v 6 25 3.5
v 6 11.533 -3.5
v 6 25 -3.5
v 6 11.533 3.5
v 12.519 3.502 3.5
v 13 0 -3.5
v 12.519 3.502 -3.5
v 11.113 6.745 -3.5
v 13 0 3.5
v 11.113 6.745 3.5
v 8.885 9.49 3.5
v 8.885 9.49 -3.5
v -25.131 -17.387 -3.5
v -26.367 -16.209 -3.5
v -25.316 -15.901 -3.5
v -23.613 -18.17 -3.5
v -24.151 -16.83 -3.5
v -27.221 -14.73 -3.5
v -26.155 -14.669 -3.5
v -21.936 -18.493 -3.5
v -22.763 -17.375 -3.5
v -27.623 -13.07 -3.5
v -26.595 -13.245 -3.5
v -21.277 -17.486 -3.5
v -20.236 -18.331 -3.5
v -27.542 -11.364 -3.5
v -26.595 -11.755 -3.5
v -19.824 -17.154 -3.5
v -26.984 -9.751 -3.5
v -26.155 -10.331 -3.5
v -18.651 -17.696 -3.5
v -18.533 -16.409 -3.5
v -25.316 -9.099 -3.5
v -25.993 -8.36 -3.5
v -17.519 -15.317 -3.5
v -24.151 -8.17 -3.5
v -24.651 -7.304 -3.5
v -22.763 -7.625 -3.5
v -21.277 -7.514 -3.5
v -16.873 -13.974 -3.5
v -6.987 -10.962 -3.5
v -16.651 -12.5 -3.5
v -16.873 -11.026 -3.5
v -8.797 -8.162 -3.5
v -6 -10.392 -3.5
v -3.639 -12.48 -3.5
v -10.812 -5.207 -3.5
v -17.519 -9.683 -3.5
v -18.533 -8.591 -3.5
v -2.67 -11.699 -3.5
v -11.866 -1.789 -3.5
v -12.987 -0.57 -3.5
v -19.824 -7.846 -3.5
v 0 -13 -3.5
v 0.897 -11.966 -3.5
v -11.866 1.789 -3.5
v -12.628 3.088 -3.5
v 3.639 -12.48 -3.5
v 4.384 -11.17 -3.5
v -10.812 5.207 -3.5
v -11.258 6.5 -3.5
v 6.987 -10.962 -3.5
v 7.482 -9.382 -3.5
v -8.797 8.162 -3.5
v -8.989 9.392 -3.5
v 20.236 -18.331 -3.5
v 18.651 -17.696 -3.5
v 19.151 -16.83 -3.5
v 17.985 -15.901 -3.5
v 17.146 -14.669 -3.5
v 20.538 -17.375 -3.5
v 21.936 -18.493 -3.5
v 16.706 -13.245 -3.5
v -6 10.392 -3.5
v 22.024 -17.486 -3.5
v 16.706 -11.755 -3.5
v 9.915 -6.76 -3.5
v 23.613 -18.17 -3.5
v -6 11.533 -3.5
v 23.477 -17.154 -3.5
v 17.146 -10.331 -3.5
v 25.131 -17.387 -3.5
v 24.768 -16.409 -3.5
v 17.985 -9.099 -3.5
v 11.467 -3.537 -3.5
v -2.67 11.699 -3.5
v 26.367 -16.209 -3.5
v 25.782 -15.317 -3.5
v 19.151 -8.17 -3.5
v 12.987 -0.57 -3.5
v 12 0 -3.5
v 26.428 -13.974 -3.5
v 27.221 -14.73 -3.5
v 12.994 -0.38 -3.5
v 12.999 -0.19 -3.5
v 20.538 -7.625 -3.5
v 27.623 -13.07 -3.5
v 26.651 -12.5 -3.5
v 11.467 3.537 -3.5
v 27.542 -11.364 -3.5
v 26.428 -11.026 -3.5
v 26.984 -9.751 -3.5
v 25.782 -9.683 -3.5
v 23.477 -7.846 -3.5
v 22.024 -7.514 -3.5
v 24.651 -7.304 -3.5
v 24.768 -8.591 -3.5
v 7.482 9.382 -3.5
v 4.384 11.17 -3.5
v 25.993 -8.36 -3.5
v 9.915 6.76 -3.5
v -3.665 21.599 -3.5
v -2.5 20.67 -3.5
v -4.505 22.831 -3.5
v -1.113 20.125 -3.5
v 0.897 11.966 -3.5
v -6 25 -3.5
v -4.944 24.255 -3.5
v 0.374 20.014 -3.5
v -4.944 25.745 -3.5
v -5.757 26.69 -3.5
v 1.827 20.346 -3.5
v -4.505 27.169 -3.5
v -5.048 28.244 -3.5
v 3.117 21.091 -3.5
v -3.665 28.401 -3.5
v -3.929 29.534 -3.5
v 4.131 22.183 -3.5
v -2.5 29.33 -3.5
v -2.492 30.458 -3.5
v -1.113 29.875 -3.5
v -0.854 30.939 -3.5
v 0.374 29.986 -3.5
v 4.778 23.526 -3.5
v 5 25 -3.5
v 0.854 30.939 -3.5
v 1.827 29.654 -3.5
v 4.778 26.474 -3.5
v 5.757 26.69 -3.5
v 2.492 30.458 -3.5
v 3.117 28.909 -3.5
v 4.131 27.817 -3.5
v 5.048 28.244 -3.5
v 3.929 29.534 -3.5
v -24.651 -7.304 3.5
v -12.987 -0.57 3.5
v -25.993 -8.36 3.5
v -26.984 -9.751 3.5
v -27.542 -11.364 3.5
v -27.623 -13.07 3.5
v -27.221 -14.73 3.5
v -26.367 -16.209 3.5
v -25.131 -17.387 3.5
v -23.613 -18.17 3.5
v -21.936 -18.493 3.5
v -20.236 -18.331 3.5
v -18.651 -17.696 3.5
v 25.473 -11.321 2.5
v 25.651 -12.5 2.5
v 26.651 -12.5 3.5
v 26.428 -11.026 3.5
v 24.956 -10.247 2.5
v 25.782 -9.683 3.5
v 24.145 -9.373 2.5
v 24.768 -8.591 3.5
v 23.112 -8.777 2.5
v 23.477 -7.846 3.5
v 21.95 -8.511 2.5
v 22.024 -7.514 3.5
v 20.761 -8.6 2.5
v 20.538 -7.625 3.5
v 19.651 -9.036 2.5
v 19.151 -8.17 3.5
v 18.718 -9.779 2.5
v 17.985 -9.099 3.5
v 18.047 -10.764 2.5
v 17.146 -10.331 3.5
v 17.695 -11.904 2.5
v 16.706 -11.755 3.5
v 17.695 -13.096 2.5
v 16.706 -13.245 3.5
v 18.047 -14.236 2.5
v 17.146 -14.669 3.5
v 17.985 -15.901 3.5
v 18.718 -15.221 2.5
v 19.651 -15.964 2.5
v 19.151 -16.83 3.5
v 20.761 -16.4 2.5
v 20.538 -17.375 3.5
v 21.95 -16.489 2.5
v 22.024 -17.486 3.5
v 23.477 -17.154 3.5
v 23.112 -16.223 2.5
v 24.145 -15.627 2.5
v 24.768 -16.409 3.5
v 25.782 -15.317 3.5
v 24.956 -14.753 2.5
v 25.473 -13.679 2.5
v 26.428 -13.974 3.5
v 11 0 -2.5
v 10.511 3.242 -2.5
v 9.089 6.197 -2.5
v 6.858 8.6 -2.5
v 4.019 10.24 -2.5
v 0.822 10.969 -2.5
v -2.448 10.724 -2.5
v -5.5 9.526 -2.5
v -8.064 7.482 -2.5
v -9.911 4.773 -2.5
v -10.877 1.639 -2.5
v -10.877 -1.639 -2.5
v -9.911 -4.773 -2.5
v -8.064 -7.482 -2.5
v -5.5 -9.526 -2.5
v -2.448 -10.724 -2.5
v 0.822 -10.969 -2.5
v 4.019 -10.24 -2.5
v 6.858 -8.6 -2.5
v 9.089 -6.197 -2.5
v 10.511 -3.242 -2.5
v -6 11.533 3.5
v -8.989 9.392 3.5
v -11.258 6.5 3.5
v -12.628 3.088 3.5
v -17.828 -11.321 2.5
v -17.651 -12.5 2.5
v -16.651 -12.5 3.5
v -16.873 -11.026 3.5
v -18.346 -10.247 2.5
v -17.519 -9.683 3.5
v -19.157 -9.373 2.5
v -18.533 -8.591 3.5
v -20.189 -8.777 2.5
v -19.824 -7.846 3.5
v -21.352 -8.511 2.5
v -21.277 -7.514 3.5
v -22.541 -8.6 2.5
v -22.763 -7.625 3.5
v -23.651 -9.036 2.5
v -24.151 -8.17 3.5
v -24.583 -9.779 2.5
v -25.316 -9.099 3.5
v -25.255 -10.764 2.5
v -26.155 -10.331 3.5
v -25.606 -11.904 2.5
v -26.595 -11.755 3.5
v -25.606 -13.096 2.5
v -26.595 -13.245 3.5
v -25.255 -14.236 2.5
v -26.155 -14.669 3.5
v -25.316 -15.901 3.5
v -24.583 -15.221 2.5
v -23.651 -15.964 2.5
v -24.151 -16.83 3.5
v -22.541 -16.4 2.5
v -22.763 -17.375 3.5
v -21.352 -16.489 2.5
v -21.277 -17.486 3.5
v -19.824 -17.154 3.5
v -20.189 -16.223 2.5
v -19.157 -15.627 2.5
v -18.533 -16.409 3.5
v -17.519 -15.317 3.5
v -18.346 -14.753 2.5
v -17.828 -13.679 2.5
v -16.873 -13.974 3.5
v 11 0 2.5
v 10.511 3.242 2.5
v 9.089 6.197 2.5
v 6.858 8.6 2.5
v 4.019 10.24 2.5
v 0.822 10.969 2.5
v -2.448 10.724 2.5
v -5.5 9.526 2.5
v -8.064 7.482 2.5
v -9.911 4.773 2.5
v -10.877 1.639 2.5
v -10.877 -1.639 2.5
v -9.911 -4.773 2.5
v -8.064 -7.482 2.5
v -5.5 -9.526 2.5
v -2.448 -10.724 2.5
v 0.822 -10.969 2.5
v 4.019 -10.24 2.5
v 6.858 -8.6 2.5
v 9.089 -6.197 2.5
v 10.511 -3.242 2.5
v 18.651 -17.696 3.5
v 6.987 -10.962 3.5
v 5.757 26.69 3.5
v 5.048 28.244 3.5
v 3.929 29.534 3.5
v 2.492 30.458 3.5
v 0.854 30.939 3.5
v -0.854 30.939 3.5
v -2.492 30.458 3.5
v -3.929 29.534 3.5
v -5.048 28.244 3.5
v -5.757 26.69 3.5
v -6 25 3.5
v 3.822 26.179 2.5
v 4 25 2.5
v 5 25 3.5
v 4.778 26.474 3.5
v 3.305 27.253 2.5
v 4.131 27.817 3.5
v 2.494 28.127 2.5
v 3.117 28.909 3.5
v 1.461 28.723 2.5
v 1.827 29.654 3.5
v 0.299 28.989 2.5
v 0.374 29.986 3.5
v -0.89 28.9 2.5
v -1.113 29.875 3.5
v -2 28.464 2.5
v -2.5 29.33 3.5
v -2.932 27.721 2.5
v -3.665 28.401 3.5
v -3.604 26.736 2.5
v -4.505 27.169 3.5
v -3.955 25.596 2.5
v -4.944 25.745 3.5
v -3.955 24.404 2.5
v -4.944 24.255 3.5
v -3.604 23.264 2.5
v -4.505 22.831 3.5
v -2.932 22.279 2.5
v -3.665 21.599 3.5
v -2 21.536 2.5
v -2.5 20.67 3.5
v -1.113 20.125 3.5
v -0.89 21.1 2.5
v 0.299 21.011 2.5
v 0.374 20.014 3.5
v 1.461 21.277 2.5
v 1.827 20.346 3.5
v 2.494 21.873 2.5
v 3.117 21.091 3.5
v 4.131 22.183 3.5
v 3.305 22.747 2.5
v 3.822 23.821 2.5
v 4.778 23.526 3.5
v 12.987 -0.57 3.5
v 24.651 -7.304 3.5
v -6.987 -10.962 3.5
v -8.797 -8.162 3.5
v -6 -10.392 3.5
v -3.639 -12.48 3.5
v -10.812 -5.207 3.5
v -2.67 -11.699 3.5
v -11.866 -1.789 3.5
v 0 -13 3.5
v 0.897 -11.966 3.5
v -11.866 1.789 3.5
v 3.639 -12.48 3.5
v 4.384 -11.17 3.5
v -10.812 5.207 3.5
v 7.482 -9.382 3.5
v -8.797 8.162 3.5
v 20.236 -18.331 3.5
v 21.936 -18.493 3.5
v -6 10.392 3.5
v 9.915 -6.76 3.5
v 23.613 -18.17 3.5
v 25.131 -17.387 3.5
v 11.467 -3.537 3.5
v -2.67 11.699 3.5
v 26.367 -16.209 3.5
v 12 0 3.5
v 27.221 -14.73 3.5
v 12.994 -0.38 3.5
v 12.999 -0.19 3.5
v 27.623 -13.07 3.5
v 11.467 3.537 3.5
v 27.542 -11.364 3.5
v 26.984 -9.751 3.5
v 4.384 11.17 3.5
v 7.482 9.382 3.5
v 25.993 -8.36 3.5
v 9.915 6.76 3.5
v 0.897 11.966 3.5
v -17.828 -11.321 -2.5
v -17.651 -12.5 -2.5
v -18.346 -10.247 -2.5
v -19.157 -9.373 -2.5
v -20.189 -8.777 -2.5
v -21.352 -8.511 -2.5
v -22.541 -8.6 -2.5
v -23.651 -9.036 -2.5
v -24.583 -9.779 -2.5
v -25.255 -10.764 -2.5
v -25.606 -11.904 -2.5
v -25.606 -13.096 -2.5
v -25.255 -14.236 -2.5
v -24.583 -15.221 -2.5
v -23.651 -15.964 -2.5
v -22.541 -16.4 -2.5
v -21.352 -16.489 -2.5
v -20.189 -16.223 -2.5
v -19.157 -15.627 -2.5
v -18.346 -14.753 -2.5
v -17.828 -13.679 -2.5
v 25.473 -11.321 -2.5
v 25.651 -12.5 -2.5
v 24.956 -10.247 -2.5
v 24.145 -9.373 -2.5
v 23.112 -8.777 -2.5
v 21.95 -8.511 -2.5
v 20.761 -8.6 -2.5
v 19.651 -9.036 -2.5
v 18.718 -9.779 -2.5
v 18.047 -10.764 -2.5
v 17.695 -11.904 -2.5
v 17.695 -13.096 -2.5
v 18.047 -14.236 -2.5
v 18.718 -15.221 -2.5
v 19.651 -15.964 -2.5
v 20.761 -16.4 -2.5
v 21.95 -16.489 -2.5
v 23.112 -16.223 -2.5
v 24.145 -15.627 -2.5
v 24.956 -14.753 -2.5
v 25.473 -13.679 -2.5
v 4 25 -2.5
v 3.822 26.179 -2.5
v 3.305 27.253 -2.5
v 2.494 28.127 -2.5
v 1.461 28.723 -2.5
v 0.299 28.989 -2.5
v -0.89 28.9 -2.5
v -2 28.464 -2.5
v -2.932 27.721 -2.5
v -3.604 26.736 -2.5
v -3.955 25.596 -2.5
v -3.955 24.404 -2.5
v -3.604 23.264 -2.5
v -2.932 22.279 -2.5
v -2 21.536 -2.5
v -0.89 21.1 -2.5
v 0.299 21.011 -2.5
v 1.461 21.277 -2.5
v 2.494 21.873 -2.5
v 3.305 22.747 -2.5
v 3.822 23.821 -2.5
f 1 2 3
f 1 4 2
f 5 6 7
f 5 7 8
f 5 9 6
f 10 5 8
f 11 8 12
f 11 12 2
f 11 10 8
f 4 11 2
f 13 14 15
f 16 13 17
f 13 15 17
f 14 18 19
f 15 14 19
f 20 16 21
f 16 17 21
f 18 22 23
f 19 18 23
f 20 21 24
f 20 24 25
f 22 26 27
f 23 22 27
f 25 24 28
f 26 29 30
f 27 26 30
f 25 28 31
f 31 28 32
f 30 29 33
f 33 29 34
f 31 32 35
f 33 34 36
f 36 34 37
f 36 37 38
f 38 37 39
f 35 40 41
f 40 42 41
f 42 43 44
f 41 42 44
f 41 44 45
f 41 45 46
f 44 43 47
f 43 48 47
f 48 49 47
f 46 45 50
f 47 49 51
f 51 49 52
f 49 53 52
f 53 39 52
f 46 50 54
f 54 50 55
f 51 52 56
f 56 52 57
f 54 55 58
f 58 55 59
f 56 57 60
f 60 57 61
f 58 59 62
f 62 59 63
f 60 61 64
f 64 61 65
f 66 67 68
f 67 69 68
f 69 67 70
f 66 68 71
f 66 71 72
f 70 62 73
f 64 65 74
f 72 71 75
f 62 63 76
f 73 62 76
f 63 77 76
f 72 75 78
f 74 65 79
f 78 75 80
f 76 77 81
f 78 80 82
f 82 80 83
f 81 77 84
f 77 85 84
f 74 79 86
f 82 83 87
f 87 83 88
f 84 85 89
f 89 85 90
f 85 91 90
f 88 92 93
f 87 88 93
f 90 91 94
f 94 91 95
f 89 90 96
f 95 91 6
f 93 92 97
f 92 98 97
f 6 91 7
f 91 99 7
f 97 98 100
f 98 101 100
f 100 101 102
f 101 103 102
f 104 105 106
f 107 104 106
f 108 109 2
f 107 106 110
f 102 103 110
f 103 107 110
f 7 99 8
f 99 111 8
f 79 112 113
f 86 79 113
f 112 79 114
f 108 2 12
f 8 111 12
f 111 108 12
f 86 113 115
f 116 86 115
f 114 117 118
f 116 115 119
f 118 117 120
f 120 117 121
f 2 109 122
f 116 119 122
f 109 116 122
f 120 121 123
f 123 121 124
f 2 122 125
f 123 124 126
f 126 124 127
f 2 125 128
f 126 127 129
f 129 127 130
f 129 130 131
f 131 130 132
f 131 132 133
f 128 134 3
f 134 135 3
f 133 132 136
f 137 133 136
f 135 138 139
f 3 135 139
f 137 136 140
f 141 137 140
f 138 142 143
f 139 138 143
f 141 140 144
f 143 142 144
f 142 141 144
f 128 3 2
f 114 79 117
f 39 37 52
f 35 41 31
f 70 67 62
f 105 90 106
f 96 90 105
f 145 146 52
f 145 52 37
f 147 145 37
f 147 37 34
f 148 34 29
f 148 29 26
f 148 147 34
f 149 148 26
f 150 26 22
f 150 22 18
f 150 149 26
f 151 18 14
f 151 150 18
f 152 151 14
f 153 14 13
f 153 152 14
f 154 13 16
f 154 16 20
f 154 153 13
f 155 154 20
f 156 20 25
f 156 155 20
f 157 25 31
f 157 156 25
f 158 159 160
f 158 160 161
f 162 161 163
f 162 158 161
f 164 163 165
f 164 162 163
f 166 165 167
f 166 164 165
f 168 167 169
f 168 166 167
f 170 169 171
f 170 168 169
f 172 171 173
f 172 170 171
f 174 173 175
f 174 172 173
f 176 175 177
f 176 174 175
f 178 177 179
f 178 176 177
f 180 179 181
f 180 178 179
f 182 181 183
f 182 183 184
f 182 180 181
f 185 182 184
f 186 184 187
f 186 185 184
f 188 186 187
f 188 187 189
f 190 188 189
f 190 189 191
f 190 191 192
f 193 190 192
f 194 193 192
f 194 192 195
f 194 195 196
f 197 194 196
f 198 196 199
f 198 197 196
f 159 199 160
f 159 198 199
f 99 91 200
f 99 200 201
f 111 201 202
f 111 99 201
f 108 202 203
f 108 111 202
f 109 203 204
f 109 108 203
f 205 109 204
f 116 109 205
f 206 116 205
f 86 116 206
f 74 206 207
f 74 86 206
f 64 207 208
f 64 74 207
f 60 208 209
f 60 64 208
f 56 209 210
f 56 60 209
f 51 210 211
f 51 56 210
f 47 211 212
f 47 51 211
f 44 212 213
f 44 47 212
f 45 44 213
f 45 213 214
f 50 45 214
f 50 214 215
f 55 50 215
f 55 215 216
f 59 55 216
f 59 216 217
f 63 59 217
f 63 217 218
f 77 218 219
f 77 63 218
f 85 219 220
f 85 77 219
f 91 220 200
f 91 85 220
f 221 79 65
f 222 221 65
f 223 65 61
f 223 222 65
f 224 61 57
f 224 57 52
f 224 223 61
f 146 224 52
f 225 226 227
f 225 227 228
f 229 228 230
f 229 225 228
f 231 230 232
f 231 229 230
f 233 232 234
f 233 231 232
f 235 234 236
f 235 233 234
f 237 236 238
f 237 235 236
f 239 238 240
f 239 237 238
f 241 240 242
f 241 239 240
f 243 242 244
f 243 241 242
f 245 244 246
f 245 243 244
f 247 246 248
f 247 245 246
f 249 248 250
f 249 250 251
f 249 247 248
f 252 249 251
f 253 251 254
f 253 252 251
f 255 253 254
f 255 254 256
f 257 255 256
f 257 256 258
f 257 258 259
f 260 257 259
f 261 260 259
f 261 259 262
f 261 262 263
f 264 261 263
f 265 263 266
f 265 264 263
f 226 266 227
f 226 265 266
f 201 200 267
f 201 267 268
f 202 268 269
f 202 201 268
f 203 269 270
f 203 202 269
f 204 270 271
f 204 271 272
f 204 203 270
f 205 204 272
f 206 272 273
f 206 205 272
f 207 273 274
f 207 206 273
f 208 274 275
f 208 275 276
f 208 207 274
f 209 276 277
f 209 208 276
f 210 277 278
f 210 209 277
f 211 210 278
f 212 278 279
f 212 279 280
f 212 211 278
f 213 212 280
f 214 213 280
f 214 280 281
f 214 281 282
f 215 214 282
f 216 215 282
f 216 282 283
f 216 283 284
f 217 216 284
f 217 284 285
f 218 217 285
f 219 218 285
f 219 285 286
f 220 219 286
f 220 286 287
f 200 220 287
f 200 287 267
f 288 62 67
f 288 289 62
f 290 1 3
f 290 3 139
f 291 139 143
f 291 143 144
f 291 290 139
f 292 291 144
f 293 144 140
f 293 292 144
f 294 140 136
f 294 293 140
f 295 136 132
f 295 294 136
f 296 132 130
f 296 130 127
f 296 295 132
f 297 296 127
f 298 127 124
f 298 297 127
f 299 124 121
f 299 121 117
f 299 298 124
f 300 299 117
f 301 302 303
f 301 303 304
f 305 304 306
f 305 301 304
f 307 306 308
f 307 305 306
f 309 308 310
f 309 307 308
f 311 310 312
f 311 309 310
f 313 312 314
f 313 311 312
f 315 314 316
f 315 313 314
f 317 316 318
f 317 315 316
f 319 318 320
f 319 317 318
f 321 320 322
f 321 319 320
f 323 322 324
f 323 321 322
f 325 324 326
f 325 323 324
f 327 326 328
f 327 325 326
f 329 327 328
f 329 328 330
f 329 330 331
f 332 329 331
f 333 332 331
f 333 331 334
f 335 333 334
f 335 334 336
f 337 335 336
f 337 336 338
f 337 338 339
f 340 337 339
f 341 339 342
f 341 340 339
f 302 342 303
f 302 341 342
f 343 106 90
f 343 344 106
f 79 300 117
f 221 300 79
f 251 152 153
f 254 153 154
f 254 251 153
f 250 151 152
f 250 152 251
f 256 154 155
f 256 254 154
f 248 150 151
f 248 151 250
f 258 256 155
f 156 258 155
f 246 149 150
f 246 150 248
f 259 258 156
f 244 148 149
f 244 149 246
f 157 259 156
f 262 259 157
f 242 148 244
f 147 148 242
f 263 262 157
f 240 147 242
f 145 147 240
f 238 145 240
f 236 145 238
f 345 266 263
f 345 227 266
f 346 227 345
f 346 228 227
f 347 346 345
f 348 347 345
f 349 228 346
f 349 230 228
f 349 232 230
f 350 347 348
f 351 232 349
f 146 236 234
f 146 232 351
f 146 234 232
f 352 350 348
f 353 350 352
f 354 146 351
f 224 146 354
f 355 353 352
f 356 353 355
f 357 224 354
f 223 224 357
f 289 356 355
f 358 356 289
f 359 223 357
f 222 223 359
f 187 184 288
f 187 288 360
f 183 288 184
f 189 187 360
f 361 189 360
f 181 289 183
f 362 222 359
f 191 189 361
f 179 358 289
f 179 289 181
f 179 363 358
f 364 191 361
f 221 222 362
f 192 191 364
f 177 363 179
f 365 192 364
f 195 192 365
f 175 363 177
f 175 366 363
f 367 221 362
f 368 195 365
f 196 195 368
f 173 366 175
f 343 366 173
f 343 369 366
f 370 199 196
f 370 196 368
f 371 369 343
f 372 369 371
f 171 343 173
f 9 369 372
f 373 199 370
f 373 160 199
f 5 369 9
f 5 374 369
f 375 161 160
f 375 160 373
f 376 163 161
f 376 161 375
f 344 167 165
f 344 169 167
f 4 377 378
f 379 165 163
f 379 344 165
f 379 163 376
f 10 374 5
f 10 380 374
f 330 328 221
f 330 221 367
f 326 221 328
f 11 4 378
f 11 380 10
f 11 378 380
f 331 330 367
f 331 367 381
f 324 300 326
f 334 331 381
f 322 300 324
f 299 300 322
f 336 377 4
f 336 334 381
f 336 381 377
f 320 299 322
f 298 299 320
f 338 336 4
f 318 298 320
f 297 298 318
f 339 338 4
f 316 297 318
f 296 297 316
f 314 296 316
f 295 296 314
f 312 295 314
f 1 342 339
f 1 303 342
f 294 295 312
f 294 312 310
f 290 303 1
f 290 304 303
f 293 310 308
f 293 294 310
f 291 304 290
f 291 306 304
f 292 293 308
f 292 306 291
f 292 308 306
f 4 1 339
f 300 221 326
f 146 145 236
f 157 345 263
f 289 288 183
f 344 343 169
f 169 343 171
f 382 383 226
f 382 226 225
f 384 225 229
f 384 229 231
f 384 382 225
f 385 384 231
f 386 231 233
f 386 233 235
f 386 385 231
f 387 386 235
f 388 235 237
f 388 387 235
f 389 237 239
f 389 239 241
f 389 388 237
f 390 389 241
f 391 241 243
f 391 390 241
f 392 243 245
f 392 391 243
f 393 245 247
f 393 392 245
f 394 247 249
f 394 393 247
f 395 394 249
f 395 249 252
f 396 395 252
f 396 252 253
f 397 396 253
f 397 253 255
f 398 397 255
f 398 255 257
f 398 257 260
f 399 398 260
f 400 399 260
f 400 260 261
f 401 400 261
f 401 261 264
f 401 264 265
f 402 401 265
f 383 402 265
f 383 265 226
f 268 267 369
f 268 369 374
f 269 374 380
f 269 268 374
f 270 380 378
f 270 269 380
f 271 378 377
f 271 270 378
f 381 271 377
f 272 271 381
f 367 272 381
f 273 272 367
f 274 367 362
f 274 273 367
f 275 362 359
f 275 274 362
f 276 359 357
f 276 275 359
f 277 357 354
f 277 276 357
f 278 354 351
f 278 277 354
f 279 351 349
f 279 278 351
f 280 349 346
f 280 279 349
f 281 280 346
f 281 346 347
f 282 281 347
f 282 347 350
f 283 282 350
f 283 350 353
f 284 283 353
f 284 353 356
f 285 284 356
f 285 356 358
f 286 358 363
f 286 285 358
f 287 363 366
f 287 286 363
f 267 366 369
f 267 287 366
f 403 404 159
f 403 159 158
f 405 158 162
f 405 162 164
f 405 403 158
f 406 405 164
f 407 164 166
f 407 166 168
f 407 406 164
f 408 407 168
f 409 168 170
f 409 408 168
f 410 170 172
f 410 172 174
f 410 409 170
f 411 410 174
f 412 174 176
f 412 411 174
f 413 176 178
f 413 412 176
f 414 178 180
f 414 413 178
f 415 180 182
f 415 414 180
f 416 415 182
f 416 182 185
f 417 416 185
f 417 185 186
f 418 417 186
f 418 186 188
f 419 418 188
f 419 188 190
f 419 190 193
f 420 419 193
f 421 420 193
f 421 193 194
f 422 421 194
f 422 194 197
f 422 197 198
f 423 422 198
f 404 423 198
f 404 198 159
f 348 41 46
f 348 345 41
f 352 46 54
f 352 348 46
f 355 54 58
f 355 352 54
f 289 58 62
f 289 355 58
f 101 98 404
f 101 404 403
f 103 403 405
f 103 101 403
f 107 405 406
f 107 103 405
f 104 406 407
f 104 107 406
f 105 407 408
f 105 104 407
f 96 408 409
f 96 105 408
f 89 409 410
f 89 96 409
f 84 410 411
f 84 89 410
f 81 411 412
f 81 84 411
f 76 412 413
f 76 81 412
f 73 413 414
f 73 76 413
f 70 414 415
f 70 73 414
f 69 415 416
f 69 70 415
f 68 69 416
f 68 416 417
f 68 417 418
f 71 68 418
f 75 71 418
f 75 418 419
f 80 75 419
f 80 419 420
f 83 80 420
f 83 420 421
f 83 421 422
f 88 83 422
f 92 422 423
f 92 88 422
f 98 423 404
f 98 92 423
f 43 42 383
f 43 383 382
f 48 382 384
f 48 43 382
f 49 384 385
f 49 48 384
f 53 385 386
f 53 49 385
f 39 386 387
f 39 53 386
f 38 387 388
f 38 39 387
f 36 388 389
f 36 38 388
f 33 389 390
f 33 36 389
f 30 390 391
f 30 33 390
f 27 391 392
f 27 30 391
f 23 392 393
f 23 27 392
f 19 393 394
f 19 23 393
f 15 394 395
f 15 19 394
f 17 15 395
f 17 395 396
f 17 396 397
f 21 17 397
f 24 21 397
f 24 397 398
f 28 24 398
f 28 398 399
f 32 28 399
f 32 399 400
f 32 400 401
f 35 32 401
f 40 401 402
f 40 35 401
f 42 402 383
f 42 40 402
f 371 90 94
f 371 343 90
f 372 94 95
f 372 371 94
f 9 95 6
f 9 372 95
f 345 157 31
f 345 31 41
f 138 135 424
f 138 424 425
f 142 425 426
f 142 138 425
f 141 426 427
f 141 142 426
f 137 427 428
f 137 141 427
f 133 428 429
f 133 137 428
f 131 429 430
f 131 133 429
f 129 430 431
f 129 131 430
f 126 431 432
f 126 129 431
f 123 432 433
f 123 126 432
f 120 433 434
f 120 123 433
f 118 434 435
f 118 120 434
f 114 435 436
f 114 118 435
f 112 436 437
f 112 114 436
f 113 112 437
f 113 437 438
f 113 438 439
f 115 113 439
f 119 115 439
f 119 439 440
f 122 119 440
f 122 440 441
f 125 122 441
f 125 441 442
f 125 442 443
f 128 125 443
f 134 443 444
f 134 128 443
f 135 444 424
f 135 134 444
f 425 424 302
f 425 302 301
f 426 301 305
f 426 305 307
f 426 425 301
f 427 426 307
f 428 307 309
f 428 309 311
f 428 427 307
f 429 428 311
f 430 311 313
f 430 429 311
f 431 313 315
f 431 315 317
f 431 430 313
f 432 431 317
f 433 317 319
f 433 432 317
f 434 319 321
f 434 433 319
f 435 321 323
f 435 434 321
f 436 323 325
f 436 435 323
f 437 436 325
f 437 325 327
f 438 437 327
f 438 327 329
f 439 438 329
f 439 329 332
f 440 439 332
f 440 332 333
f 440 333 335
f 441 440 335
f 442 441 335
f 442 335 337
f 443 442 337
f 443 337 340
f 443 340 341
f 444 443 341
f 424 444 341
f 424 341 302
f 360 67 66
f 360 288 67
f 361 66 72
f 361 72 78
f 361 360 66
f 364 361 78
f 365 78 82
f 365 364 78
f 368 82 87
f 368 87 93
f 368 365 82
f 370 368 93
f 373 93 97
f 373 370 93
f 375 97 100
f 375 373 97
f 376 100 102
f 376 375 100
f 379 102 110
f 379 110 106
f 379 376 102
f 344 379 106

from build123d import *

# Parameters (mm, degrees)
F0_R     = 11
F0_R_2   = 4
F1_DEPTH = 3.5
F2_SIZE  = 1


# Not quite as in the source:
# - a feature names something its author has since deleted; it is built from what else it names


with BuildPart() as f1:
    # F0 (on Top) → F1 (new body, symmetric)
    with BuildSketch(Plane.XY):
        with BuildLine():
            ThreePointArc((-6, 11.5325625947), (0, 13), (6, 11.5325625947))
            Line((6, 11.5325625947), (6, 25))
            ThreePointArc((6, 25), (0, 19), (-6, 25))
            Line((-6, 25), (-6, 11.5325625947))
        make_face()
        with BuildLine():
            ThreePointArc((-6.9874921777, -10.96243372), (-11.2583302492, -6.5), (-12.9874921777, -0.5701288746))
            Line((-12.9874921777, -0.5701288746), (-24.6506350946, -7.3038475773))
            ThreePointArc((-24.6506350946, -7.3038475773), (-18.6506350946, -7.3038475773), (-15.6506350946, -12.5))
            ThreePointArc((-15.6506350946, -12.5), (-16.4544826719, -15.5), (-18.6506350946, -17.6961524227))
            Line((-18.6506350946, -17.6961524227), (-6.9874921777, -10.96243372))
        make_face()
        with BuildLine():
            Line((24.6506350946, -7.3038475773), (12.9874921777, -0.5701288746))
            ThreePointArc((12.9874921777, -0.5701288746), (11.2583302492, -6.5), (6.9874921777, -10.96243372))
            Line((6.9874921777, -10.96243372), (18.6506350946, -17.6961524227))
            ThreePointArc((18.6506350946, -17.6961524227), (16.4544826719, -9.5), (24.6506350946, -7.3038475773))
        make_face()
        with BuildLine():
            ThreePointArc((12.9874921777, -0.5701288746), (12.9968726683, -0.2851330301), (13, 0))
            ThreePointArc((13, 0), (11.1130553854, 6.7453687816), (6, 11.5325625947))
            ThreePointArc((6, 11.5325625947), (0, 13), (-6, 11.5325625947))
            ThreePointArc((-6, 11.5325625947), (-11.2583302492, 6.5), (-12.9874921777, -0.5701288746))
            ThreePointArc((-12.9874921777, -0.5701288746), (-11.2583302492, -6.5), (-6.9874921777, -10.96243372))
            ThreePointArc((-6.9874921777, -10.96243372), (0, -13), (6.9874921777, -10.96243372))
            ThreePointArc((6.9874921777, -10.96243372), (11.2583302492, -6.5), (12.9874921777, -0.5701288746))
        make_face()
        Circle(F0_R, mode=Mode.SUBTRACT)
        with BuildLine():
            ThreePointArc((-6, 25), (0, 19), (6, 25))
            ThreePointArc((6, 25), (0, 31), (-6, 25))
        make_face()
        with Locations((0, 25)):
            Circle(F0_R_2, mode=Mode.SUBTRACT)
        with BuildLine():
            ThreePointArc((-15.6506350946, -12.5), (-18.6506350946, -7.3038475773), (-24.6506350946, -7.3038475773))
            ThreePointArc((-24.6506350946, -7.3038475773), (-26.8467875173, -15.5), (-18.6506350946, -17.6961524227))
            ThreePointArc((-18.6506350946, -17.6961524227), (-16.4544826719, -15.5), (-15.6506350946, -12.5))
        make_face()
        with Locations((-21.6506350946, -12.5)):
            Circle(F0_R_2, mode=Mode.SUBTRACT)
        with BuildLine():
            ThreePointArc((27.6506350946, -12.5), (26.8467875173, -9.5), (24.6506350946, -7.3038475773))
            ThreePointArc((24.6506350946, -7.3038475773), (16.4544826719, -9.5), (18.6506350946, -17.6961524227))
            ThreePointArc((18.6506350946, -17.6961524227), (24.6506350946, -17.6961524227), (27.6506350946, -12.5))
        make_face()
        with Locations((21.6506350946, -12.5)):
            Circle(F0_R_2, mode=Mode.SUBTRACT)
    extrude(amount=F1_DEPTH, both=True)

    # F2
    f2_edges = [f1.edges().sort_by_distance(p)[0] for p in [
        (-4, 25, 3.5),
        (-11, 0, 3.5),
        (-25.650635, -12.5, 3.5),
        (17.650635, -12.5, 3.5),
        (-25.650635, -12.5, -3.5),
        (-11, 0, -3.5),
        (17.650635, -12.5, -3.5),
        (-4, 25, -3.5),
    ]]
    chamfer(f2_edges, length=F2_SIZE)


solid = f1.part
